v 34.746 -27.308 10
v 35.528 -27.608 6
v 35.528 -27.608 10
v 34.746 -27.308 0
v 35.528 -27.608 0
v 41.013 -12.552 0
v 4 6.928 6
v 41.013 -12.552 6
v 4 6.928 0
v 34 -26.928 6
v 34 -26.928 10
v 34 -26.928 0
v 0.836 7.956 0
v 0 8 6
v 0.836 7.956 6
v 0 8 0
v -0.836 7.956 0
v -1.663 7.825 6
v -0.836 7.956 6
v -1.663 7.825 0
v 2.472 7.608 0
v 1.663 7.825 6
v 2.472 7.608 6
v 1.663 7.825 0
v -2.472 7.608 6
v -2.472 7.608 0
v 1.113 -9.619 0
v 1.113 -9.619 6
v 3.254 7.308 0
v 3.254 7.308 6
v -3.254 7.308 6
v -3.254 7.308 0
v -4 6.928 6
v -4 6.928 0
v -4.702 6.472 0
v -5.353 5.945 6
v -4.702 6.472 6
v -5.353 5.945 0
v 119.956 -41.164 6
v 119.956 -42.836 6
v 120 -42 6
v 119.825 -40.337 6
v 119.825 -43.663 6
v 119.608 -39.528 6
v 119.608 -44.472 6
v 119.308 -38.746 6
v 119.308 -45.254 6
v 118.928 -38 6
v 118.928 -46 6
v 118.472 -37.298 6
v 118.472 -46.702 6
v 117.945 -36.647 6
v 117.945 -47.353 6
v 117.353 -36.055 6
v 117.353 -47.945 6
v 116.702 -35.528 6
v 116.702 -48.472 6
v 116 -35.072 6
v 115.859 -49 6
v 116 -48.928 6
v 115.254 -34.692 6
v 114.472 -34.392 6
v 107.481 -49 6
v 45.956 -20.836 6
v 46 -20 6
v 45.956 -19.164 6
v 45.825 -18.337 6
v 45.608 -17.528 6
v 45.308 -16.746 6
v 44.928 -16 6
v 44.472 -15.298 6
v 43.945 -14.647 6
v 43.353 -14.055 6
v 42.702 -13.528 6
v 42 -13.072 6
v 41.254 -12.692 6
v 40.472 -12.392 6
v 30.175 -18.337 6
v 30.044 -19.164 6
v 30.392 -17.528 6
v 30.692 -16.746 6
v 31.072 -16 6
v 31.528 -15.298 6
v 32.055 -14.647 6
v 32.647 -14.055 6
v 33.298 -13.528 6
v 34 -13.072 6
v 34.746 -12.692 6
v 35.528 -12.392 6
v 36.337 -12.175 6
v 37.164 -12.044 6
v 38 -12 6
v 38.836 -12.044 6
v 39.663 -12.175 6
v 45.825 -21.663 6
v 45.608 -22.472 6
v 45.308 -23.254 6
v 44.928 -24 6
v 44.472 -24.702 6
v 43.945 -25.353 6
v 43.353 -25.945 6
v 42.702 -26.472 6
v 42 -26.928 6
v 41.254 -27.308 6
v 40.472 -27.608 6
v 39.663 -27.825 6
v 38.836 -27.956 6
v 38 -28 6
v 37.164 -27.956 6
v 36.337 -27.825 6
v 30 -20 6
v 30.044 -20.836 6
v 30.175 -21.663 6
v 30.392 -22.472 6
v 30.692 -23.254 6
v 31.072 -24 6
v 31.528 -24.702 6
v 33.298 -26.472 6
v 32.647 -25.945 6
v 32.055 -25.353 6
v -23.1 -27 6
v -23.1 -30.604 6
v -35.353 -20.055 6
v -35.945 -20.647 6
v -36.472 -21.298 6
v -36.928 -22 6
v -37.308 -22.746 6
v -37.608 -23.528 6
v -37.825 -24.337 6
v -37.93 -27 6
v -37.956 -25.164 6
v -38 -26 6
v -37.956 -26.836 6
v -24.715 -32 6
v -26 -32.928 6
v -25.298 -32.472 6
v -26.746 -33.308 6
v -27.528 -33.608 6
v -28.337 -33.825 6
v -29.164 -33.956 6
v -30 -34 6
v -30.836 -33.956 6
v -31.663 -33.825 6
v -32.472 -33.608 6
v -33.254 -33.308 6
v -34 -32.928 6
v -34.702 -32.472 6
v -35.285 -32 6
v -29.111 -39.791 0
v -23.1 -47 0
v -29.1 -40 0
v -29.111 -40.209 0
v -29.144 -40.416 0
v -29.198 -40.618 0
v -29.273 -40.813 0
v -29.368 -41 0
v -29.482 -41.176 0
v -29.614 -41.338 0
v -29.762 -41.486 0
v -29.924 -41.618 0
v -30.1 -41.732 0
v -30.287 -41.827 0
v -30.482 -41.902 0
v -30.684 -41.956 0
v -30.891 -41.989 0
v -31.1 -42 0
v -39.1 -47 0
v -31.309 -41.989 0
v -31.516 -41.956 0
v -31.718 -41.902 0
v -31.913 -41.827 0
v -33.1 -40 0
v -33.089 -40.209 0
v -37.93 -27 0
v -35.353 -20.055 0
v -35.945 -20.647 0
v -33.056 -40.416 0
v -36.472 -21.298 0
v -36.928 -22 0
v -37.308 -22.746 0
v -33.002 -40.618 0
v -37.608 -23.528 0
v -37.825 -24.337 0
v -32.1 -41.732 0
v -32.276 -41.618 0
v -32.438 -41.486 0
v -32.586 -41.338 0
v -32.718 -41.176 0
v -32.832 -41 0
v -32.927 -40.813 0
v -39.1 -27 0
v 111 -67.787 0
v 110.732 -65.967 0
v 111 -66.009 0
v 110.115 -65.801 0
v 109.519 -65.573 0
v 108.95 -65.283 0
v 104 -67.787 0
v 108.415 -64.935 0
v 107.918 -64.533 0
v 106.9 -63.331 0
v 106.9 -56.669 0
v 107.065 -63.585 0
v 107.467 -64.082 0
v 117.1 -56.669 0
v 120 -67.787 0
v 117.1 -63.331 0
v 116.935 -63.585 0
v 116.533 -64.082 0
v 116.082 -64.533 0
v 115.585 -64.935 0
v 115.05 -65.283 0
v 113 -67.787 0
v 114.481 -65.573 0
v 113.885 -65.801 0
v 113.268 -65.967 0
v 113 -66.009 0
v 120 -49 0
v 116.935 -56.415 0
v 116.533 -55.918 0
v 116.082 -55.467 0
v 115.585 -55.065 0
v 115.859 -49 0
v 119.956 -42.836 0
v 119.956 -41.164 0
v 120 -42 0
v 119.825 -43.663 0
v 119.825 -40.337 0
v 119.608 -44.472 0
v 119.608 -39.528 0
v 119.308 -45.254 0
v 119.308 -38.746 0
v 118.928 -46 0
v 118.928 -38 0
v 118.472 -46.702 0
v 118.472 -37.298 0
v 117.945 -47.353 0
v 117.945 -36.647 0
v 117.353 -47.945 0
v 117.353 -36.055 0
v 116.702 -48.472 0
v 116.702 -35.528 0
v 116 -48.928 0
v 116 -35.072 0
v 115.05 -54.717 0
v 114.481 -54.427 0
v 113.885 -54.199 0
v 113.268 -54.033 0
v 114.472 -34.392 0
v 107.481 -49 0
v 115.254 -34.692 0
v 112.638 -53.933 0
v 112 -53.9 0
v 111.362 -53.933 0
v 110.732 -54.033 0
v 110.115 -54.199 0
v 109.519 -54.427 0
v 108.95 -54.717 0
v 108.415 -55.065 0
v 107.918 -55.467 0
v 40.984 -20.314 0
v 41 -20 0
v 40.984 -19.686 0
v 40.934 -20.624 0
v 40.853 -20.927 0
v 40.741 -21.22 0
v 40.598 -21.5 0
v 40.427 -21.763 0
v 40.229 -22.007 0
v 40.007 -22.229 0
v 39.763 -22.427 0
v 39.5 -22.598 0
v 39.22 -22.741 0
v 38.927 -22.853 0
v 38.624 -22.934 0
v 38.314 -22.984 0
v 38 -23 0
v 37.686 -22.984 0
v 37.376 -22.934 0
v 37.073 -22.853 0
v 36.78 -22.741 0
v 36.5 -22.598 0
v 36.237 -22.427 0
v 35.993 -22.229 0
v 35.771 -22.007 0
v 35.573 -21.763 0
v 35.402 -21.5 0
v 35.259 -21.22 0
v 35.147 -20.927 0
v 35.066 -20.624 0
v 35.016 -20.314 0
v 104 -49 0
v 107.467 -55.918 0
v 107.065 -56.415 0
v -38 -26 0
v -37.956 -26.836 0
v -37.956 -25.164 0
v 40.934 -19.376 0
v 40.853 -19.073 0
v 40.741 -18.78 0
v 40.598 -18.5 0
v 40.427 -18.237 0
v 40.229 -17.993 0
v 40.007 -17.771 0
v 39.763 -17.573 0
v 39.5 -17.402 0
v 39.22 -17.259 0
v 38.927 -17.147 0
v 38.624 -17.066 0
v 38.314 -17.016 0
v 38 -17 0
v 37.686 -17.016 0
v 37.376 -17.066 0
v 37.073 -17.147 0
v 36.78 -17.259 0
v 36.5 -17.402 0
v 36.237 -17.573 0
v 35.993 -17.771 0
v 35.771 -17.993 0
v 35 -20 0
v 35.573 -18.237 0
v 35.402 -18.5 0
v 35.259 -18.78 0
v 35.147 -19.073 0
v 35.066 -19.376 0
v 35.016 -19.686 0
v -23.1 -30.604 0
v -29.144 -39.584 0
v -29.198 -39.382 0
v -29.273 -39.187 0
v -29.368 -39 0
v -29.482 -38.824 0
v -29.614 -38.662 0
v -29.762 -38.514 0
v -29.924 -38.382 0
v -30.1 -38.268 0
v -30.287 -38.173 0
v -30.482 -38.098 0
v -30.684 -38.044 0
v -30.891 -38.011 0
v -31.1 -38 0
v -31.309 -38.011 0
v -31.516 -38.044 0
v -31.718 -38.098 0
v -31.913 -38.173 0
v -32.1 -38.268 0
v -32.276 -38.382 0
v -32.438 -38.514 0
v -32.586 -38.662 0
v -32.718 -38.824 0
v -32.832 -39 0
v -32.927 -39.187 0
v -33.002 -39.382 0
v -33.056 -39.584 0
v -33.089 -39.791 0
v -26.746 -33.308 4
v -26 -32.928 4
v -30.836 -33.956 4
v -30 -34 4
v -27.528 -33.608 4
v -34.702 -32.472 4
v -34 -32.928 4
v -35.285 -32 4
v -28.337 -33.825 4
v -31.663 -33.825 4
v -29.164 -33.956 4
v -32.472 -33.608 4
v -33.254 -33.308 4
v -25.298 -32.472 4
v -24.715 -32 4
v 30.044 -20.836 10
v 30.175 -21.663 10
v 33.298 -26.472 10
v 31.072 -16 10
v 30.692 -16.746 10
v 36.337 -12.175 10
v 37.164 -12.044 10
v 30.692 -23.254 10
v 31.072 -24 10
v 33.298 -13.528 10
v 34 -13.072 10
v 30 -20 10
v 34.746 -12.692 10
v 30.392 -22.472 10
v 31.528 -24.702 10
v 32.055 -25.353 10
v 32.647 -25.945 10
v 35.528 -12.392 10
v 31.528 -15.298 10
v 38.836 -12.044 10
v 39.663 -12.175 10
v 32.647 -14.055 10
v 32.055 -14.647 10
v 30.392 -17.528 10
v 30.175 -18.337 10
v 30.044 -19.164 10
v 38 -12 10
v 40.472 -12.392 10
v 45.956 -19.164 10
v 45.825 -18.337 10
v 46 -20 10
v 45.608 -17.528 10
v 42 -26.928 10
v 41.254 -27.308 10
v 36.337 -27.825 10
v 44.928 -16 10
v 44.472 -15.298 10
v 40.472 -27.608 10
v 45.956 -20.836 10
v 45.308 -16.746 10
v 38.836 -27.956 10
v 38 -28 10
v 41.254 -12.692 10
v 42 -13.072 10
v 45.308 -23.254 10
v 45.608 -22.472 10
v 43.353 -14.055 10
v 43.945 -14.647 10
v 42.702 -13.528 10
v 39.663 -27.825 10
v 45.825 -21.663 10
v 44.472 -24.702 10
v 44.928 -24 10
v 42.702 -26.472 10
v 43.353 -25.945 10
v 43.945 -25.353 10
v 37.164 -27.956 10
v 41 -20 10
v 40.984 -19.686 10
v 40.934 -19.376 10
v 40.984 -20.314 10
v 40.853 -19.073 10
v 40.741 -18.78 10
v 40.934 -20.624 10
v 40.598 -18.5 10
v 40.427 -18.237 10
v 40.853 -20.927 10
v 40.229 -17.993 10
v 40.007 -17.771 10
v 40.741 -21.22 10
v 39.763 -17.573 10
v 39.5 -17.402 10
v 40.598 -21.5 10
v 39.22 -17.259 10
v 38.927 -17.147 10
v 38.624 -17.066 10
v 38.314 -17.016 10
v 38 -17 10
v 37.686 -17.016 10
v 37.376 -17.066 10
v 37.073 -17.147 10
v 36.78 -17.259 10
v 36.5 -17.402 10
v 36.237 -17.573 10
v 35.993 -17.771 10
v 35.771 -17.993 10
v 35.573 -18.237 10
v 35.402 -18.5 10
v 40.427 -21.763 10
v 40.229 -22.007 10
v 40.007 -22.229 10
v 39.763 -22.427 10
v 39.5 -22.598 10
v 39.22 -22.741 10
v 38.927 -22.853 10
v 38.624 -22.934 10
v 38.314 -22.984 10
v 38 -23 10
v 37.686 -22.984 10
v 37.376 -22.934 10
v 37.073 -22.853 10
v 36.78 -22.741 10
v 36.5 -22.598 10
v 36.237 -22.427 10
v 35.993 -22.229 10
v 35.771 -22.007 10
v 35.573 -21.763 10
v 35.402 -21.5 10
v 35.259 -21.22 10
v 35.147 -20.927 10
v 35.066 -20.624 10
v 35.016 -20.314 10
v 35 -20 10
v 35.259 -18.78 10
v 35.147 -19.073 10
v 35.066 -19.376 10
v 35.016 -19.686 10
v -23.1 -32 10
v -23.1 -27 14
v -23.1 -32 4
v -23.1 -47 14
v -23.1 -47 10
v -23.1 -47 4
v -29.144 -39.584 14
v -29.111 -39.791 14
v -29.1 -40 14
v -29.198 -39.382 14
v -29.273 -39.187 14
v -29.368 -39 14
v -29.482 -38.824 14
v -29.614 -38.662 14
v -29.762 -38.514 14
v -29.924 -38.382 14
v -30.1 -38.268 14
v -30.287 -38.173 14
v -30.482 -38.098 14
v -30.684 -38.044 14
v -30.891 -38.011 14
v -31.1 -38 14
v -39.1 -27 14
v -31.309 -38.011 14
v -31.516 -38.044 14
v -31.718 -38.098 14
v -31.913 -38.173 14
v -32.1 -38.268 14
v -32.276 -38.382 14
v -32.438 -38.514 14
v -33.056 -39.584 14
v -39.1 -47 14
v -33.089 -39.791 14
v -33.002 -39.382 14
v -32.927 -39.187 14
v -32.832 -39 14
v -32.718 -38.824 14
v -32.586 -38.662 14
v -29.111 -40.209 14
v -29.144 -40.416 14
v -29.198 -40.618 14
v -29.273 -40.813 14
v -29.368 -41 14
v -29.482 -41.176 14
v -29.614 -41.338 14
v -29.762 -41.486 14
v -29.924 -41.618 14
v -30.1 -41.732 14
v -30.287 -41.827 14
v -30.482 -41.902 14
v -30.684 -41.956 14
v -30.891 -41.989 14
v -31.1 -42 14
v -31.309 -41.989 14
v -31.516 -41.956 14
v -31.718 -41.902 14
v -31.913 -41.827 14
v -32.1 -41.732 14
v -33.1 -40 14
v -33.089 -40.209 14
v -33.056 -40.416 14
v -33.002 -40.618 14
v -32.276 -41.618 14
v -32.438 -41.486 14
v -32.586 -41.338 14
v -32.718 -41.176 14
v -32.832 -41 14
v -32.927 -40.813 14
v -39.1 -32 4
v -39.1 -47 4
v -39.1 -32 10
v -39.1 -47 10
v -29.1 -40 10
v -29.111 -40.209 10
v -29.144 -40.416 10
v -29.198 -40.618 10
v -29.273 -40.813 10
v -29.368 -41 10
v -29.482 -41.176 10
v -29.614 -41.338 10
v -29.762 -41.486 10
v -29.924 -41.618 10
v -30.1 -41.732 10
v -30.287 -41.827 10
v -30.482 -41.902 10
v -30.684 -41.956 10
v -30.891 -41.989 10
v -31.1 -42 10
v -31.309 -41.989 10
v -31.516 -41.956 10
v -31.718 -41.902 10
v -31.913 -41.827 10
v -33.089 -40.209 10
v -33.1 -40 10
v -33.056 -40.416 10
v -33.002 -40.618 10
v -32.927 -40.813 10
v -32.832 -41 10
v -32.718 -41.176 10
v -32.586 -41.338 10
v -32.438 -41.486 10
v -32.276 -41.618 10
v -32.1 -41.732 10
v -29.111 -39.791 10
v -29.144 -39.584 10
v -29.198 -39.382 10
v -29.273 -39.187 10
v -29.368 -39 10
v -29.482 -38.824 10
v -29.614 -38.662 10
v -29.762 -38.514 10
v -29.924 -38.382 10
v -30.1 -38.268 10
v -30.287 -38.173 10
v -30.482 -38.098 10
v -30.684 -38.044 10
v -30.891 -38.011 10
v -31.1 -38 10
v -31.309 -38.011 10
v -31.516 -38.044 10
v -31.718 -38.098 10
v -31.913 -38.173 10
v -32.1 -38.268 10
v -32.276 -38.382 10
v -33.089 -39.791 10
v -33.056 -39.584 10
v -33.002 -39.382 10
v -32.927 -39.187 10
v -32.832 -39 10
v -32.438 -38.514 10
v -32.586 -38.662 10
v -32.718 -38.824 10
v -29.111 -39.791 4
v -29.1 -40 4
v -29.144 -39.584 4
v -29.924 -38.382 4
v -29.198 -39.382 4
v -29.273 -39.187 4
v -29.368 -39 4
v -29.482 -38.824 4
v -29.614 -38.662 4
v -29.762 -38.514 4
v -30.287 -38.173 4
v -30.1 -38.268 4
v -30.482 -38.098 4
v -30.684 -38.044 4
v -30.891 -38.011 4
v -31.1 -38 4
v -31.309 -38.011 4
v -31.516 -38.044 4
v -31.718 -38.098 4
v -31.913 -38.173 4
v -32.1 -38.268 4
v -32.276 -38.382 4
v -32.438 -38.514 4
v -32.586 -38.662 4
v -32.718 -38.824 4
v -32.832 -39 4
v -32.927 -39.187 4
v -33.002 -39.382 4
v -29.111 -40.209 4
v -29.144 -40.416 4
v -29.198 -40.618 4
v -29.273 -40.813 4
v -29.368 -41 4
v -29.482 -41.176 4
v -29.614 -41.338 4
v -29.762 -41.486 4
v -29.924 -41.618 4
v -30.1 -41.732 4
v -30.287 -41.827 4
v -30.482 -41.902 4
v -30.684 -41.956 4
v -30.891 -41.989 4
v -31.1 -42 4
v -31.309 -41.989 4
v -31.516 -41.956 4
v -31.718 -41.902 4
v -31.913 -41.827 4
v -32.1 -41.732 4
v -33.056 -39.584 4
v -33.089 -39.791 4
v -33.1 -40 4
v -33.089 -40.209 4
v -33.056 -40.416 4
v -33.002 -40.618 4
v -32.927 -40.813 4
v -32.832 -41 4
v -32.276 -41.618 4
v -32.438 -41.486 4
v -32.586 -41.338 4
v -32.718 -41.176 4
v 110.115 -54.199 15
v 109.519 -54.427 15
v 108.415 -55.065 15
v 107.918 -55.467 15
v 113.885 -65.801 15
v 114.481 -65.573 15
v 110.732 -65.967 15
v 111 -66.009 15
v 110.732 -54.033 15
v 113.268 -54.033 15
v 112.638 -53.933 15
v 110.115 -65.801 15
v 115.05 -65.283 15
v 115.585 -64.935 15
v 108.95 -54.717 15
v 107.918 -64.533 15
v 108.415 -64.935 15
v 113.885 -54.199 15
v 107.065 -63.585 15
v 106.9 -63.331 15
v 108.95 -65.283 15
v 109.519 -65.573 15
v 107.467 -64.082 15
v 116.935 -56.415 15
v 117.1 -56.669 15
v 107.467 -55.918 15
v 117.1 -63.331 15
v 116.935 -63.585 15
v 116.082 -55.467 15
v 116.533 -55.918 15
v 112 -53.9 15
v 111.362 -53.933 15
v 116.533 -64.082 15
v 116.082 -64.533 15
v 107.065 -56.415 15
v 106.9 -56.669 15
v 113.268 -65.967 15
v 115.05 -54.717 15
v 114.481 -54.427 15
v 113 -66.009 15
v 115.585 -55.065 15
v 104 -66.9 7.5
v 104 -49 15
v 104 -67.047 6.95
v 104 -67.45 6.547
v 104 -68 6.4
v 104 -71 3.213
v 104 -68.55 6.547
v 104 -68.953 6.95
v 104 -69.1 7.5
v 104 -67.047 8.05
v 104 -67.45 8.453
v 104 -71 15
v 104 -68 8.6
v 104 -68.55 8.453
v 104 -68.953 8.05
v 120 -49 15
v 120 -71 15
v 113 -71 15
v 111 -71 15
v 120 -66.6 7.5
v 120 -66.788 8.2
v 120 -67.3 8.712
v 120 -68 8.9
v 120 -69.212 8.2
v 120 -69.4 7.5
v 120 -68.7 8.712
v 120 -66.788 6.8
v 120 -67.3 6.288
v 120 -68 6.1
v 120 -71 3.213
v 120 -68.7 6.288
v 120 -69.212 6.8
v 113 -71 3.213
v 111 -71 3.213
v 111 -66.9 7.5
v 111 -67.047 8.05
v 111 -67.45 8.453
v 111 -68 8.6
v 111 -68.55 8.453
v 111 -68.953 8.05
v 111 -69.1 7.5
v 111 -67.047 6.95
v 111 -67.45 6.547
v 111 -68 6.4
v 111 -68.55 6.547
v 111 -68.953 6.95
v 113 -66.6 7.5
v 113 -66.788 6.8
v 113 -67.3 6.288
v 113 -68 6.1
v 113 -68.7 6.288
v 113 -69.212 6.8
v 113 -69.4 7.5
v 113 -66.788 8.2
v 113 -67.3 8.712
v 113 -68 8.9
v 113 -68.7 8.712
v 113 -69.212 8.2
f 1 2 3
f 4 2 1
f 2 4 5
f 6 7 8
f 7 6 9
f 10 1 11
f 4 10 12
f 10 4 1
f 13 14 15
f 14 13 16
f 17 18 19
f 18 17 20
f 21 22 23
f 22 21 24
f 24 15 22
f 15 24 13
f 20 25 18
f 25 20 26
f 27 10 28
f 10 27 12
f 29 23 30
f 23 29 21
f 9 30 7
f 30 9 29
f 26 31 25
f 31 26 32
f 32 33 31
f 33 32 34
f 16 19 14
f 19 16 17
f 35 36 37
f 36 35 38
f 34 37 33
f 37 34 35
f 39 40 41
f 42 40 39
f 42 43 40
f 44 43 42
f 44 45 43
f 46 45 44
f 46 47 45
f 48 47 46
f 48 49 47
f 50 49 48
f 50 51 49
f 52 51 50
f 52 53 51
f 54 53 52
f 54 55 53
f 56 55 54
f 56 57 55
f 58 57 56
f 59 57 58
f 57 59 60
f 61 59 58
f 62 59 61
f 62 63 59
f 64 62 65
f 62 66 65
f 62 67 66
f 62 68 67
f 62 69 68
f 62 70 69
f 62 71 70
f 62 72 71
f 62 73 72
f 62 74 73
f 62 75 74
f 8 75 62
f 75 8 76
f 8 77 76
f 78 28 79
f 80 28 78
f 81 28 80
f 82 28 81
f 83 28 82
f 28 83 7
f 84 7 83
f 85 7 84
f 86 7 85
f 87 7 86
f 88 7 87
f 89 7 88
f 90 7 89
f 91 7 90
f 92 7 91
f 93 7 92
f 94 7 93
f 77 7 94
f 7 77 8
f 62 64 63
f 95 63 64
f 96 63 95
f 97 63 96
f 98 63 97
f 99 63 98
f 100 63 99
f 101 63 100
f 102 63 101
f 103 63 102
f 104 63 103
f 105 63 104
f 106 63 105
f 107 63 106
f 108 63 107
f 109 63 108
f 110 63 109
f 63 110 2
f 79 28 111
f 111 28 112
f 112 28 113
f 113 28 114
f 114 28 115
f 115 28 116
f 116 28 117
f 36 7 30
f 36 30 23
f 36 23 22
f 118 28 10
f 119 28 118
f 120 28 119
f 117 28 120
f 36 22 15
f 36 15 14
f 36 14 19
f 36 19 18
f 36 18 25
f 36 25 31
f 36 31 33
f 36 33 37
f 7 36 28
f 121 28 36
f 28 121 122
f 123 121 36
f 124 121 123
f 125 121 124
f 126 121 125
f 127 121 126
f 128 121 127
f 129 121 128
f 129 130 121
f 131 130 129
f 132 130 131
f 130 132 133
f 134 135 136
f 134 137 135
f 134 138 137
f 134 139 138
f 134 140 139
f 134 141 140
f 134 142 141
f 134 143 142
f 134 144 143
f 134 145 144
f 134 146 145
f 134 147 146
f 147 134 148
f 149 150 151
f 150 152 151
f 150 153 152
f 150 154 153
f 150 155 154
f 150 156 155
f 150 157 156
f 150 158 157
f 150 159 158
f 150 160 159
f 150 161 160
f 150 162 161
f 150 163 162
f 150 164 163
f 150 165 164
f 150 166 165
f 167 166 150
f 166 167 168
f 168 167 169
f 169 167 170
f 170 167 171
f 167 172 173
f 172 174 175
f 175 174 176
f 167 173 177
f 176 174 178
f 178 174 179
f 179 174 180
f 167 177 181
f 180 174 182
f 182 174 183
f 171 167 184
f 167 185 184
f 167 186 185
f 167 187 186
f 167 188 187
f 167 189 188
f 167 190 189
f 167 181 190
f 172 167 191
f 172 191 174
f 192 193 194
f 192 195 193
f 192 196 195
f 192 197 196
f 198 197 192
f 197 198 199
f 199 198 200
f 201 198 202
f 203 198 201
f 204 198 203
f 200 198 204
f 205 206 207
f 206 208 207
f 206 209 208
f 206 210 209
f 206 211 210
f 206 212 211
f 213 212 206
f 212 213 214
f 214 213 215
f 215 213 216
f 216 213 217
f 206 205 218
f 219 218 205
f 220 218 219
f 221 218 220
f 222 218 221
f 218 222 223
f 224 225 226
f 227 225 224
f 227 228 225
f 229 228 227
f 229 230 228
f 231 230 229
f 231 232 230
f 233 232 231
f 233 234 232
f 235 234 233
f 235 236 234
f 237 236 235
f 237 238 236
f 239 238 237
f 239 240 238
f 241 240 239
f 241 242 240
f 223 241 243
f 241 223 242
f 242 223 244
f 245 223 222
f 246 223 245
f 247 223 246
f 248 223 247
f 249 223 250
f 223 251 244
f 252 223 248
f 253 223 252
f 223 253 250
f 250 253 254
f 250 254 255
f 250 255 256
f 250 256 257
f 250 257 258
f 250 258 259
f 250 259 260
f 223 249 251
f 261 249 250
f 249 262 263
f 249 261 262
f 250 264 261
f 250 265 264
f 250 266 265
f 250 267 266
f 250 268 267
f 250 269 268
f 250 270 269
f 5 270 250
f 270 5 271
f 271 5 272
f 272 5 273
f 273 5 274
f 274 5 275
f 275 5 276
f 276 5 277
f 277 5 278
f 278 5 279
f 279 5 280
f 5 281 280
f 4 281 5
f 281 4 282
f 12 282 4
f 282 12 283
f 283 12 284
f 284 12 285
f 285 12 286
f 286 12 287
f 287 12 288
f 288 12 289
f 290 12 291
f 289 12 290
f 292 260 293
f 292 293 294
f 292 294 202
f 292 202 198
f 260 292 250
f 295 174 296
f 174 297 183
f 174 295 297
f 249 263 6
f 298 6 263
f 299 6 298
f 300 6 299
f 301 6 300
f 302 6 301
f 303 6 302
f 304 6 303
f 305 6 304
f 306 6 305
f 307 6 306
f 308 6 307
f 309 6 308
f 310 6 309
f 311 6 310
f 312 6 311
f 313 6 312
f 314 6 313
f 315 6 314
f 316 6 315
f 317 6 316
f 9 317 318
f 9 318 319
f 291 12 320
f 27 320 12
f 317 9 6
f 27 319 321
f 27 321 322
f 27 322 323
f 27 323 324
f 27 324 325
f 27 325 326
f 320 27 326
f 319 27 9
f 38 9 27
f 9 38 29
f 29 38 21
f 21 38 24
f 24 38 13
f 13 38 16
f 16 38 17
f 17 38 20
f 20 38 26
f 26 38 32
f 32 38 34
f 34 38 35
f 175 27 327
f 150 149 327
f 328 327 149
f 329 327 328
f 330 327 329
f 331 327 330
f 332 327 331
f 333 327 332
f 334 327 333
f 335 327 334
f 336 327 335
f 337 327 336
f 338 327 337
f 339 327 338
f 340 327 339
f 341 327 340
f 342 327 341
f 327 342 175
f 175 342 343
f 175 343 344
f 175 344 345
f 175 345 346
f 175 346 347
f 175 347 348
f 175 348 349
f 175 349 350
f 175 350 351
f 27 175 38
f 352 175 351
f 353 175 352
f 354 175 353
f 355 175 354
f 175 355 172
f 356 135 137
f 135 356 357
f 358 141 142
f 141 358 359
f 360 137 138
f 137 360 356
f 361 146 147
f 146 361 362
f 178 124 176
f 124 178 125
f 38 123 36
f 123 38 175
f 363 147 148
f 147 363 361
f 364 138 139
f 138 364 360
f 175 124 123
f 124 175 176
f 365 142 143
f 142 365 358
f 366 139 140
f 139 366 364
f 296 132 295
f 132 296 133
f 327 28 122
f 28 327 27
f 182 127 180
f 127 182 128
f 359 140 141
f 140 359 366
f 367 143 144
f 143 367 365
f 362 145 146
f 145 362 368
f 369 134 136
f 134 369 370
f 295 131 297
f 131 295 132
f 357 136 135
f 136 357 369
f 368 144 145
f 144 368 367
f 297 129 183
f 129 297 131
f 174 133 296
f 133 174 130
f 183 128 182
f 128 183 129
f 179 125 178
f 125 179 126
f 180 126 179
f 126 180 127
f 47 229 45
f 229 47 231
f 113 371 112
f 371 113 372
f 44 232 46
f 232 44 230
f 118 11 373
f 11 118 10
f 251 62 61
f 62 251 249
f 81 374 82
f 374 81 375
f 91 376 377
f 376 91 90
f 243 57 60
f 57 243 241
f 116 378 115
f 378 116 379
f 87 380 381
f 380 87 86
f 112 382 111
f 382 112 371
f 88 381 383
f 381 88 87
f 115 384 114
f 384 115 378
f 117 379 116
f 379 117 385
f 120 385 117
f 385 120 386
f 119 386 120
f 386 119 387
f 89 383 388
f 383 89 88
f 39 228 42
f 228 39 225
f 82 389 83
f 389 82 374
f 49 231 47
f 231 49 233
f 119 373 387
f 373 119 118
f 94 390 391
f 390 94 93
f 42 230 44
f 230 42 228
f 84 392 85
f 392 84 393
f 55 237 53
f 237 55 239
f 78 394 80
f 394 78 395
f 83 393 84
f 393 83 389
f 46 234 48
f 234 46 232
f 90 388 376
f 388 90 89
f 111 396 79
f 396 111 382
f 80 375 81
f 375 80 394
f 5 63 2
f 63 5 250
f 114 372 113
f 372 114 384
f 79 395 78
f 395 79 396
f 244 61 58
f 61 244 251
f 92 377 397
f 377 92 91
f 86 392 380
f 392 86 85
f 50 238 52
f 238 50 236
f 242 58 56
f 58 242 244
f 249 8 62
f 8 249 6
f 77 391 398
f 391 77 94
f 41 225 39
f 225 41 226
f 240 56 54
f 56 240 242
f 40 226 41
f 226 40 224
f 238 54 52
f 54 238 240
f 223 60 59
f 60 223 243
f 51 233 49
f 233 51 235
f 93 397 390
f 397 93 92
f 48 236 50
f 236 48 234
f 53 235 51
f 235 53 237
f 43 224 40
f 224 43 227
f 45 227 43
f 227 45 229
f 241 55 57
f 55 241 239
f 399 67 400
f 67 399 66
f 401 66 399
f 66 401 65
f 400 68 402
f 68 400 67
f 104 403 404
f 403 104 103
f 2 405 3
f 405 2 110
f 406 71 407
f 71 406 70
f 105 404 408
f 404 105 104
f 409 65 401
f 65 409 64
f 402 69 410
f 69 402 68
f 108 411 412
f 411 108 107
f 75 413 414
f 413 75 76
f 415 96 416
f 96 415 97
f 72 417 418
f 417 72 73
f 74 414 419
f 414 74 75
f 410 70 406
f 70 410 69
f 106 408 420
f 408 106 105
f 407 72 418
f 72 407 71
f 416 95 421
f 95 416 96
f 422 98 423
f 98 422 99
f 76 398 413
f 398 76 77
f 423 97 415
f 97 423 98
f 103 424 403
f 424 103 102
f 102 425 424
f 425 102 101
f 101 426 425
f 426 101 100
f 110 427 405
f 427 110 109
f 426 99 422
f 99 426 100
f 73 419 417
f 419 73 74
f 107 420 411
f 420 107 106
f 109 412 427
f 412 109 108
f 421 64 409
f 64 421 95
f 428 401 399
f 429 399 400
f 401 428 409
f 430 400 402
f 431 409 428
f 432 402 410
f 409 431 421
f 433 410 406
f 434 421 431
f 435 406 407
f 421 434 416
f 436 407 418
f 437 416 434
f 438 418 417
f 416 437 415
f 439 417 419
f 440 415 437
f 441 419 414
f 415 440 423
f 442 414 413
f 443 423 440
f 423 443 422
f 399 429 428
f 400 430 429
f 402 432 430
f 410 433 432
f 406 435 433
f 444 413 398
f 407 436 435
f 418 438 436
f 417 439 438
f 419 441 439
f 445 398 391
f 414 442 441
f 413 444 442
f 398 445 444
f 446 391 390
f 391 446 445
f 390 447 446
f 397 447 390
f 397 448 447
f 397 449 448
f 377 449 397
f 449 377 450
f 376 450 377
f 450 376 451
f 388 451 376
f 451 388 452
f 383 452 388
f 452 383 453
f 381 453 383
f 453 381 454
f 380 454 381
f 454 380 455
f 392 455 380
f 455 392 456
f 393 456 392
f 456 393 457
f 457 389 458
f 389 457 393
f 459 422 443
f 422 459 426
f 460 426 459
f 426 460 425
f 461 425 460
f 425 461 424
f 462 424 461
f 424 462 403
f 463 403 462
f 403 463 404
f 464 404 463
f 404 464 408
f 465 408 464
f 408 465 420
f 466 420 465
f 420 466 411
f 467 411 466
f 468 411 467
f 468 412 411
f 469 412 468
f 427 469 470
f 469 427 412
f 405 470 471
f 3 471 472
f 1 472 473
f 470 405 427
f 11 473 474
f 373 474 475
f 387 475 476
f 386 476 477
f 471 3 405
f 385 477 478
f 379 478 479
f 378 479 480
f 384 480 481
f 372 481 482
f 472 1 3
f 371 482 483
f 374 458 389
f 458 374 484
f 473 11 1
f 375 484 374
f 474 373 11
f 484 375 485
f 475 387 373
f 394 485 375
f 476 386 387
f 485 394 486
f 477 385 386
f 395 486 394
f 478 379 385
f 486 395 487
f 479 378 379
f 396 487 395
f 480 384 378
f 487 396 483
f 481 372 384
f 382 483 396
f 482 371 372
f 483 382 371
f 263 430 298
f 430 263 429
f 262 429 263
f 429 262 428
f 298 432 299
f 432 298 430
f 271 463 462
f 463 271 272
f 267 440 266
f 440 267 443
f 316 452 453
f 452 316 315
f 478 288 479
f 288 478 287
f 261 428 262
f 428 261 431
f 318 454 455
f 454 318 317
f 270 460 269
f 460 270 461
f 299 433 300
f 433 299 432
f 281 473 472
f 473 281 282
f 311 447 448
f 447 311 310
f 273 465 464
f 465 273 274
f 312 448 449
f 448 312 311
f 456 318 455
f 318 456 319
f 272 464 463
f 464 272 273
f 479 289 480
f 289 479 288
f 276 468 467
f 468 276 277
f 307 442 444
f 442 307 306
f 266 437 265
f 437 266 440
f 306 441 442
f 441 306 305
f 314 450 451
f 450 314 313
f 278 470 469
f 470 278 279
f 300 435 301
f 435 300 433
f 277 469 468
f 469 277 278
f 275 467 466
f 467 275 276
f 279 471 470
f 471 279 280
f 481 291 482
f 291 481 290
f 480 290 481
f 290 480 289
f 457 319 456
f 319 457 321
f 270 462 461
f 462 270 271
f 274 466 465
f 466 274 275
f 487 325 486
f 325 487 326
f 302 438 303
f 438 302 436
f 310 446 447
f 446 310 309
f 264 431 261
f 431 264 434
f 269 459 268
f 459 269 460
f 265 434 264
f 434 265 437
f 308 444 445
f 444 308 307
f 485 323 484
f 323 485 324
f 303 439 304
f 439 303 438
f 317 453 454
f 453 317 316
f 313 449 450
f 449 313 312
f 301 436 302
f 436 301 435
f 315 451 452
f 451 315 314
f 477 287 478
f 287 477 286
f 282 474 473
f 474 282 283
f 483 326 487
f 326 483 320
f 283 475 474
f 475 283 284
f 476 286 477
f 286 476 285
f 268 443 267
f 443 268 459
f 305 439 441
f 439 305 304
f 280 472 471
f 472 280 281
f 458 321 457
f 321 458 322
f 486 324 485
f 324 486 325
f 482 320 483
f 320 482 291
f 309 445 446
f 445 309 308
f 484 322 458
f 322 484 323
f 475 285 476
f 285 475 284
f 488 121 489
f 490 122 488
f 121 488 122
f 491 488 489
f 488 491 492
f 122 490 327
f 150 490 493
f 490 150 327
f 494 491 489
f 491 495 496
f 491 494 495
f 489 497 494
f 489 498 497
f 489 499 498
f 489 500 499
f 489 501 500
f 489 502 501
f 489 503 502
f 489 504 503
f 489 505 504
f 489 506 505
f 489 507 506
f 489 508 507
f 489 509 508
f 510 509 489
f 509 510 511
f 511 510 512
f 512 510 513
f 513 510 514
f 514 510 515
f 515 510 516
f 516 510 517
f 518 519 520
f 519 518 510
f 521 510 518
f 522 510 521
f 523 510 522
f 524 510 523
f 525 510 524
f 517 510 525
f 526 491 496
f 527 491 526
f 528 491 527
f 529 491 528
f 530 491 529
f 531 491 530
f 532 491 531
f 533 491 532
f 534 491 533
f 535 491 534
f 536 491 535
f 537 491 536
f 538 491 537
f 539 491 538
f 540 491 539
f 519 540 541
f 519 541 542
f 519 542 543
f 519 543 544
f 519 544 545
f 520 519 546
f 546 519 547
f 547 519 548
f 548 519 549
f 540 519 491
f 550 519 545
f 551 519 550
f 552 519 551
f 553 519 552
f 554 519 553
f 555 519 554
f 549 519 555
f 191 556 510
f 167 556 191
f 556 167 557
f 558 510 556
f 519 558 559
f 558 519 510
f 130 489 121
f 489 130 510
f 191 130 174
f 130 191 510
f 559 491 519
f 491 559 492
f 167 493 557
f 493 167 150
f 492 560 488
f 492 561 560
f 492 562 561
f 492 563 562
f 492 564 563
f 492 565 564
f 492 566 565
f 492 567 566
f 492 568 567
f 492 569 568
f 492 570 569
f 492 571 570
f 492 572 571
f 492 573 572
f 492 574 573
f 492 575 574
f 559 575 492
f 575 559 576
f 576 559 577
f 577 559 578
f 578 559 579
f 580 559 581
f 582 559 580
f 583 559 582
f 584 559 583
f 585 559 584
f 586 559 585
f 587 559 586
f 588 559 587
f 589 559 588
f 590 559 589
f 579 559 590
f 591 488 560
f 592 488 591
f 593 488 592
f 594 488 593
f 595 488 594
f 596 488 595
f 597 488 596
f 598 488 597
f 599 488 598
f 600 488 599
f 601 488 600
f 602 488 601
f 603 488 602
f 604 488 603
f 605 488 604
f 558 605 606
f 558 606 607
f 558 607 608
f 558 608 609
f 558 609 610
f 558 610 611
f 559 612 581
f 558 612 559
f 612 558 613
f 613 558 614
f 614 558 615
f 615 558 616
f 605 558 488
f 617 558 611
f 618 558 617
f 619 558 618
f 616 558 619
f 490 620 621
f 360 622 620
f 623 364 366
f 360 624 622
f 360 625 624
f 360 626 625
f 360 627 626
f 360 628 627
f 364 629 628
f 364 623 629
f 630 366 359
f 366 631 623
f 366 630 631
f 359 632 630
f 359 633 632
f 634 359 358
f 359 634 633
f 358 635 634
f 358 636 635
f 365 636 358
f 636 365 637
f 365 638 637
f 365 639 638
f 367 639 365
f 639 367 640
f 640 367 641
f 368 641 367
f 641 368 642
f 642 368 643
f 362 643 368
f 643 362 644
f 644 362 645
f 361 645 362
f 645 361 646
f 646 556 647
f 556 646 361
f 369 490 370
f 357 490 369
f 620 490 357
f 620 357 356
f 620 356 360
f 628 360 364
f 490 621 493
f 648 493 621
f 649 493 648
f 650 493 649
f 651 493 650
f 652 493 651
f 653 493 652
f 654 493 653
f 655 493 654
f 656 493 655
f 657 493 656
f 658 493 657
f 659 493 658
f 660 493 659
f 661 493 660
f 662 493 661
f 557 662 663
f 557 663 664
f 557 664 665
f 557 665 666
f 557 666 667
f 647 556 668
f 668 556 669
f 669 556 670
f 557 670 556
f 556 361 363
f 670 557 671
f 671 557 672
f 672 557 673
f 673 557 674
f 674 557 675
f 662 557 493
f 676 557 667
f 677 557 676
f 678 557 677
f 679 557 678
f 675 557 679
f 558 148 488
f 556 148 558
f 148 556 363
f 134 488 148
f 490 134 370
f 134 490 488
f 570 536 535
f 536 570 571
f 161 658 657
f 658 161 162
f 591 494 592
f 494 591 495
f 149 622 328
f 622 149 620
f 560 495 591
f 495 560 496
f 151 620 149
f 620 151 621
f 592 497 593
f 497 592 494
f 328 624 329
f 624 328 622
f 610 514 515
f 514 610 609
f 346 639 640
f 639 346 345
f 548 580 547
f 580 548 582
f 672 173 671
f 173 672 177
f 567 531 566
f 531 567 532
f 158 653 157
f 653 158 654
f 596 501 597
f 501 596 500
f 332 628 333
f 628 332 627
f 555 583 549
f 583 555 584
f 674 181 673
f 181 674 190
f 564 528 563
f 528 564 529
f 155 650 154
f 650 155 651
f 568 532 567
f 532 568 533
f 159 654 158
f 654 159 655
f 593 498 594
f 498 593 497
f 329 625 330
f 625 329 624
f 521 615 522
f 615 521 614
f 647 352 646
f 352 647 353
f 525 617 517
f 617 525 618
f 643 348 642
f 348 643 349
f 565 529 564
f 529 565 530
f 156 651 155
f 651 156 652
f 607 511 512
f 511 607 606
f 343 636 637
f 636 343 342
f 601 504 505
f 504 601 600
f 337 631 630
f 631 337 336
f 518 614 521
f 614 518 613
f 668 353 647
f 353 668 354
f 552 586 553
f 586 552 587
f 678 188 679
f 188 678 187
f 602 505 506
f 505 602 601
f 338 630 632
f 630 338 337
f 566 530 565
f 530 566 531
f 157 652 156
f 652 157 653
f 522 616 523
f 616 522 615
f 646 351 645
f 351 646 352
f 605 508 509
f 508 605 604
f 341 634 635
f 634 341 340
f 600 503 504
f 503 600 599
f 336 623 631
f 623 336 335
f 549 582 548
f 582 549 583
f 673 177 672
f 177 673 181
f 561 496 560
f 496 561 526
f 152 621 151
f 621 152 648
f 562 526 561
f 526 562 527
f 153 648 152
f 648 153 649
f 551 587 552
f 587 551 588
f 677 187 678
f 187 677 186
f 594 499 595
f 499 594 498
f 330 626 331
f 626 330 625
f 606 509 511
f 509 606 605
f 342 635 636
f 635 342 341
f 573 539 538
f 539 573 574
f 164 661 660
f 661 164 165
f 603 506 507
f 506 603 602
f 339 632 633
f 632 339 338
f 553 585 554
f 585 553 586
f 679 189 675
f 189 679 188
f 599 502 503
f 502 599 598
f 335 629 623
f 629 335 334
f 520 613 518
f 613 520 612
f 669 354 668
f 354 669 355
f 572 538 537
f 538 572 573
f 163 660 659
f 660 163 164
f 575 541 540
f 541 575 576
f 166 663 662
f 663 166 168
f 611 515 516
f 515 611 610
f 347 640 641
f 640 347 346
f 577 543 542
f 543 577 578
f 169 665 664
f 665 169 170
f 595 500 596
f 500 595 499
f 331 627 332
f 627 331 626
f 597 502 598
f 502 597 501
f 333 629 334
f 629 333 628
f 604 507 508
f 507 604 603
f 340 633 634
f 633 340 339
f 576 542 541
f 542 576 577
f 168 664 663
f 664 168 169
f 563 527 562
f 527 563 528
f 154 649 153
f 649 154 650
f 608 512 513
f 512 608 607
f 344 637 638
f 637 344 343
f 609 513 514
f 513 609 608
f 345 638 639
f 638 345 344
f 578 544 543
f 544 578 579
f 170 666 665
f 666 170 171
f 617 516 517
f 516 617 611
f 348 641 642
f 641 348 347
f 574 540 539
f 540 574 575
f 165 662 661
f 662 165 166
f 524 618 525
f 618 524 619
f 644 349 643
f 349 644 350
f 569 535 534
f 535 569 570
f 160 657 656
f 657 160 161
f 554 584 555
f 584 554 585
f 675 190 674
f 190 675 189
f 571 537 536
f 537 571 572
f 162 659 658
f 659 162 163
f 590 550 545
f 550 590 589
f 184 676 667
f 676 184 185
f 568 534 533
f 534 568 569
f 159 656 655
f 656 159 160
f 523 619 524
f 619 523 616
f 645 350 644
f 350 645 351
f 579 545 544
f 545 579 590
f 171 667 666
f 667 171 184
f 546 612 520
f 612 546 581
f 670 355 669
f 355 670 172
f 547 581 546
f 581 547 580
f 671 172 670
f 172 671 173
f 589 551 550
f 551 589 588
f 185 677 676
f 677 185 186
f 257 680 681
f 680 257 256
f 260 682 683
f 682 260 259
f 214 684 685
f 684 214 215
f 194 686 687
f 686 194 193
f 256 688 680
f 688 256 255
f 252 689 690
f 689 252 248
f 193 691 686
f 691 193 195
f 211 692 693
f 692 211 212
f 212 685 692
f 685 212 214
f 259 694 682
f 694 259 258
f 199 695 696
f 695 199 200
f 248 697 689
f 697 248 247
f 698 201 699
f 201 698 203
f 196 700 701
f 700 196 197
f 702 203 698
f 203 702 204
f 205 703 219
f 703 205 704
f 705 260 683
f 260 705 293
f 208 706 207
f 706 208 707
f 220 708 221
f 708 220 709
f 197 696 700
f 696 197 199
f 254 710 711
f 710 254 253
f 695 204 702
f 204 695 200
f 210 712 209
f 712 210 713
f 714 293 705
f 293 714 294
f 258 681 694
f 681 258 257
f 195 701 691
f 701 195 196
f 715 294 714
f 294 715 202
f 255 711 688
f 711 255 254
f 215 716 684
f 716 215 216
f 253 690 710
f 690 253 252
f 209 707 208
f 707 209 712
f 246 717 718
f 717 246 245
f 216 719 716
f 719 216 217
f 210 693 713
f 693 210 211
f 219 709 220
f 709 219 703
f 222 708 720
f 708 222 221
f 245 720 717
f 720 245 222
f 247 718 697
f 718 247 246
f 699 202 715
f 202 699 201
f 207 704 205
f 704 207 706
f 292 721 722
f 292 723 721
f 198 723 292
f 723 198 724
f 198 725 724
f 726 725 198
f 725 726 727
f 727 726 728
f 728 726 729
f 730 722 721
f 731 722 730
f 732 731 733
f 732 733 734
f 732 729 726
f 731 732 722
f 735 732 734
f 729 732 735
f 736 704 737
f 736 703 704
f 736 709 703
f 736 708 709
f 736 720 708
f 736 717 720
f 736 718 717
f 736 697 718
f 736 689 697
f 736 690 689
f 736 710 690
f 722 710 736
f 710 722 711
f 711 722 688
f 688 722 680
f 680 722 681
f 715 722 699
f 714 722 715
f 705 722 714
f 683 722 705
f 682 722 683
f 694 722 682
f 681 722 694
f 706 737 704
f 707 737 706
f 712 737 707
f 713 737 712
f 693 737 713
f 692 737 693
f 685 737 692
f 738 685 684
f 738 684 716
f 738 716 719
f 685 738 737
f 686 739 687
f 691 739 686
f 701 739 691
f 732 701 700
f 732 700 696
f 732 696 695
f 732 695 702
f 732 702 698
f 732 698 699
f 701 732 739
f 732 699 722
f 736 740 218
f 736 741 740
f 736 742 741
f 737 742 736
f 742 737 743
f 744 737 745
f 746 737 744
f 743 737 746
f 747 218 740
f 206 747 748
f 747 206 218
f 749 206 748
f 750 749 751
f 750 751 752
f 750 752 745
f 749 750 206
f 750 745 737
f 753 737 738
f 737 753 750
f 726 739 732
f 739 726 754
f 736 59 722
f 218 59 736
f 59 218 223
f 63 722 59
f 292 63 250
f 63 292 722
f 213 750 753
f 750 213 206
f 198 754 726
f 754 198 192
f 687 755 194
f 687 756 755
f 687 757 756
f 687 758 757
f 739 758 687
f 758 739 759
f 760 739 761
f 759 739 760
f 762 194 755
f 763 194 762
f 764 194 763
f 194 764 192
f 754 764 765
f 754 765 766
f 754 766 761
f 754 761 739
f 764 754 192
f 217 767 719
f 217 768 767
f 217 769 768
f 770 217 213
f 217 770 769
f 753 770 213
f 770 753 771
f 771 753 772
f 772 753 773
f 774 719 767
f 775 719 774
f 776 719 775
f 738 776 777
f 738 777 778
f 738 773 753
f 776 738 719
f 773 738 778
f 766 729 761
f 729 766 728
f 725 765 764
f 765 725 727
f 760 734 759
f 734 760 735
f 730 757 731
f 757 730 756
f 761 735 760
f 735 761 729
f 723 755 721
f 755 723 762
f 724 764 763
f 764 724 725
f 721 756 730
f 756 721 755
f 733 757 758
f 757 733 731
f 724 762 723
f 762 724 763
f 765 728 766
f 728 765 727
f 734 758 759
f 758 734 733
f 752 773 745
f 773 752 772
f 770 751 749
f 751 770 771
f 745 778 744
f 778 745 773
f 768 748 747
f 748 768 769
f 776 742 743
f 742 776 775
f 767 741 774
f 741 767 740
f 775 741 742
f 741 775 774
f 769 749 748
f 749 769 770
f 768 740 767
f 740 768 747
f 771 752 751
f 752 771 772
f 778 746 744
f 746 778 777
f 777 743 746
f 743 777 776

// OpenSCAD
$fn=60;
rotate([0,0,0])
difference(){
union(){
hull(){
cylinder(d=16,h=6);
translate([38,-20,0])cylinder(d=16,h=6);
}
hull(){
cylinder(d=16,h=6);
translate([-30,-26,0])cylinder(d=16,h=6);
}
hull(){
translate([38,-20,0])cylinder(d=16,h=6);
translate([112,-42,0])cylinder(d=16,h=6);
}
translate([38,-20,0])cylinder(d=16,h=10);
}
translate([38,-20,-1])cylinder(d=6,h=18);
}

difference(){
translate([-39.1,-47,0])cube([16,20,14]);
translate([-40,-52,4])cube([18,20,6]);
translate([-31.1,-40,-1])cylinder(d=4,h=25);    
}


translate([112,-60,0])rotate([0,0,180])
difference(){
translate([-8,-11,0])cube([16,22,15]);
difference(){
    translate([0,0,-1])cylinder(d=12.2,h=25,$fn=60);
    translate([6.1,0,-1])cube([2,16,40],center=true);
    translate([-6.1,0,-1])cube([2,16,40],center=true);
}
translate([0,14,-15])rotate([45,0,0])cube(30,center=true);
translate([-1,0,-1])cube([2,22,25]);
translate([-9,8,7.5])rotate([0,90,0])
cylinder(d=2.2,h=21,$fn=12);
translate([-9,8,7.5])rotate([0,90,0])
cylinder(d=2.8,h=10,$fn=12);
}
 
